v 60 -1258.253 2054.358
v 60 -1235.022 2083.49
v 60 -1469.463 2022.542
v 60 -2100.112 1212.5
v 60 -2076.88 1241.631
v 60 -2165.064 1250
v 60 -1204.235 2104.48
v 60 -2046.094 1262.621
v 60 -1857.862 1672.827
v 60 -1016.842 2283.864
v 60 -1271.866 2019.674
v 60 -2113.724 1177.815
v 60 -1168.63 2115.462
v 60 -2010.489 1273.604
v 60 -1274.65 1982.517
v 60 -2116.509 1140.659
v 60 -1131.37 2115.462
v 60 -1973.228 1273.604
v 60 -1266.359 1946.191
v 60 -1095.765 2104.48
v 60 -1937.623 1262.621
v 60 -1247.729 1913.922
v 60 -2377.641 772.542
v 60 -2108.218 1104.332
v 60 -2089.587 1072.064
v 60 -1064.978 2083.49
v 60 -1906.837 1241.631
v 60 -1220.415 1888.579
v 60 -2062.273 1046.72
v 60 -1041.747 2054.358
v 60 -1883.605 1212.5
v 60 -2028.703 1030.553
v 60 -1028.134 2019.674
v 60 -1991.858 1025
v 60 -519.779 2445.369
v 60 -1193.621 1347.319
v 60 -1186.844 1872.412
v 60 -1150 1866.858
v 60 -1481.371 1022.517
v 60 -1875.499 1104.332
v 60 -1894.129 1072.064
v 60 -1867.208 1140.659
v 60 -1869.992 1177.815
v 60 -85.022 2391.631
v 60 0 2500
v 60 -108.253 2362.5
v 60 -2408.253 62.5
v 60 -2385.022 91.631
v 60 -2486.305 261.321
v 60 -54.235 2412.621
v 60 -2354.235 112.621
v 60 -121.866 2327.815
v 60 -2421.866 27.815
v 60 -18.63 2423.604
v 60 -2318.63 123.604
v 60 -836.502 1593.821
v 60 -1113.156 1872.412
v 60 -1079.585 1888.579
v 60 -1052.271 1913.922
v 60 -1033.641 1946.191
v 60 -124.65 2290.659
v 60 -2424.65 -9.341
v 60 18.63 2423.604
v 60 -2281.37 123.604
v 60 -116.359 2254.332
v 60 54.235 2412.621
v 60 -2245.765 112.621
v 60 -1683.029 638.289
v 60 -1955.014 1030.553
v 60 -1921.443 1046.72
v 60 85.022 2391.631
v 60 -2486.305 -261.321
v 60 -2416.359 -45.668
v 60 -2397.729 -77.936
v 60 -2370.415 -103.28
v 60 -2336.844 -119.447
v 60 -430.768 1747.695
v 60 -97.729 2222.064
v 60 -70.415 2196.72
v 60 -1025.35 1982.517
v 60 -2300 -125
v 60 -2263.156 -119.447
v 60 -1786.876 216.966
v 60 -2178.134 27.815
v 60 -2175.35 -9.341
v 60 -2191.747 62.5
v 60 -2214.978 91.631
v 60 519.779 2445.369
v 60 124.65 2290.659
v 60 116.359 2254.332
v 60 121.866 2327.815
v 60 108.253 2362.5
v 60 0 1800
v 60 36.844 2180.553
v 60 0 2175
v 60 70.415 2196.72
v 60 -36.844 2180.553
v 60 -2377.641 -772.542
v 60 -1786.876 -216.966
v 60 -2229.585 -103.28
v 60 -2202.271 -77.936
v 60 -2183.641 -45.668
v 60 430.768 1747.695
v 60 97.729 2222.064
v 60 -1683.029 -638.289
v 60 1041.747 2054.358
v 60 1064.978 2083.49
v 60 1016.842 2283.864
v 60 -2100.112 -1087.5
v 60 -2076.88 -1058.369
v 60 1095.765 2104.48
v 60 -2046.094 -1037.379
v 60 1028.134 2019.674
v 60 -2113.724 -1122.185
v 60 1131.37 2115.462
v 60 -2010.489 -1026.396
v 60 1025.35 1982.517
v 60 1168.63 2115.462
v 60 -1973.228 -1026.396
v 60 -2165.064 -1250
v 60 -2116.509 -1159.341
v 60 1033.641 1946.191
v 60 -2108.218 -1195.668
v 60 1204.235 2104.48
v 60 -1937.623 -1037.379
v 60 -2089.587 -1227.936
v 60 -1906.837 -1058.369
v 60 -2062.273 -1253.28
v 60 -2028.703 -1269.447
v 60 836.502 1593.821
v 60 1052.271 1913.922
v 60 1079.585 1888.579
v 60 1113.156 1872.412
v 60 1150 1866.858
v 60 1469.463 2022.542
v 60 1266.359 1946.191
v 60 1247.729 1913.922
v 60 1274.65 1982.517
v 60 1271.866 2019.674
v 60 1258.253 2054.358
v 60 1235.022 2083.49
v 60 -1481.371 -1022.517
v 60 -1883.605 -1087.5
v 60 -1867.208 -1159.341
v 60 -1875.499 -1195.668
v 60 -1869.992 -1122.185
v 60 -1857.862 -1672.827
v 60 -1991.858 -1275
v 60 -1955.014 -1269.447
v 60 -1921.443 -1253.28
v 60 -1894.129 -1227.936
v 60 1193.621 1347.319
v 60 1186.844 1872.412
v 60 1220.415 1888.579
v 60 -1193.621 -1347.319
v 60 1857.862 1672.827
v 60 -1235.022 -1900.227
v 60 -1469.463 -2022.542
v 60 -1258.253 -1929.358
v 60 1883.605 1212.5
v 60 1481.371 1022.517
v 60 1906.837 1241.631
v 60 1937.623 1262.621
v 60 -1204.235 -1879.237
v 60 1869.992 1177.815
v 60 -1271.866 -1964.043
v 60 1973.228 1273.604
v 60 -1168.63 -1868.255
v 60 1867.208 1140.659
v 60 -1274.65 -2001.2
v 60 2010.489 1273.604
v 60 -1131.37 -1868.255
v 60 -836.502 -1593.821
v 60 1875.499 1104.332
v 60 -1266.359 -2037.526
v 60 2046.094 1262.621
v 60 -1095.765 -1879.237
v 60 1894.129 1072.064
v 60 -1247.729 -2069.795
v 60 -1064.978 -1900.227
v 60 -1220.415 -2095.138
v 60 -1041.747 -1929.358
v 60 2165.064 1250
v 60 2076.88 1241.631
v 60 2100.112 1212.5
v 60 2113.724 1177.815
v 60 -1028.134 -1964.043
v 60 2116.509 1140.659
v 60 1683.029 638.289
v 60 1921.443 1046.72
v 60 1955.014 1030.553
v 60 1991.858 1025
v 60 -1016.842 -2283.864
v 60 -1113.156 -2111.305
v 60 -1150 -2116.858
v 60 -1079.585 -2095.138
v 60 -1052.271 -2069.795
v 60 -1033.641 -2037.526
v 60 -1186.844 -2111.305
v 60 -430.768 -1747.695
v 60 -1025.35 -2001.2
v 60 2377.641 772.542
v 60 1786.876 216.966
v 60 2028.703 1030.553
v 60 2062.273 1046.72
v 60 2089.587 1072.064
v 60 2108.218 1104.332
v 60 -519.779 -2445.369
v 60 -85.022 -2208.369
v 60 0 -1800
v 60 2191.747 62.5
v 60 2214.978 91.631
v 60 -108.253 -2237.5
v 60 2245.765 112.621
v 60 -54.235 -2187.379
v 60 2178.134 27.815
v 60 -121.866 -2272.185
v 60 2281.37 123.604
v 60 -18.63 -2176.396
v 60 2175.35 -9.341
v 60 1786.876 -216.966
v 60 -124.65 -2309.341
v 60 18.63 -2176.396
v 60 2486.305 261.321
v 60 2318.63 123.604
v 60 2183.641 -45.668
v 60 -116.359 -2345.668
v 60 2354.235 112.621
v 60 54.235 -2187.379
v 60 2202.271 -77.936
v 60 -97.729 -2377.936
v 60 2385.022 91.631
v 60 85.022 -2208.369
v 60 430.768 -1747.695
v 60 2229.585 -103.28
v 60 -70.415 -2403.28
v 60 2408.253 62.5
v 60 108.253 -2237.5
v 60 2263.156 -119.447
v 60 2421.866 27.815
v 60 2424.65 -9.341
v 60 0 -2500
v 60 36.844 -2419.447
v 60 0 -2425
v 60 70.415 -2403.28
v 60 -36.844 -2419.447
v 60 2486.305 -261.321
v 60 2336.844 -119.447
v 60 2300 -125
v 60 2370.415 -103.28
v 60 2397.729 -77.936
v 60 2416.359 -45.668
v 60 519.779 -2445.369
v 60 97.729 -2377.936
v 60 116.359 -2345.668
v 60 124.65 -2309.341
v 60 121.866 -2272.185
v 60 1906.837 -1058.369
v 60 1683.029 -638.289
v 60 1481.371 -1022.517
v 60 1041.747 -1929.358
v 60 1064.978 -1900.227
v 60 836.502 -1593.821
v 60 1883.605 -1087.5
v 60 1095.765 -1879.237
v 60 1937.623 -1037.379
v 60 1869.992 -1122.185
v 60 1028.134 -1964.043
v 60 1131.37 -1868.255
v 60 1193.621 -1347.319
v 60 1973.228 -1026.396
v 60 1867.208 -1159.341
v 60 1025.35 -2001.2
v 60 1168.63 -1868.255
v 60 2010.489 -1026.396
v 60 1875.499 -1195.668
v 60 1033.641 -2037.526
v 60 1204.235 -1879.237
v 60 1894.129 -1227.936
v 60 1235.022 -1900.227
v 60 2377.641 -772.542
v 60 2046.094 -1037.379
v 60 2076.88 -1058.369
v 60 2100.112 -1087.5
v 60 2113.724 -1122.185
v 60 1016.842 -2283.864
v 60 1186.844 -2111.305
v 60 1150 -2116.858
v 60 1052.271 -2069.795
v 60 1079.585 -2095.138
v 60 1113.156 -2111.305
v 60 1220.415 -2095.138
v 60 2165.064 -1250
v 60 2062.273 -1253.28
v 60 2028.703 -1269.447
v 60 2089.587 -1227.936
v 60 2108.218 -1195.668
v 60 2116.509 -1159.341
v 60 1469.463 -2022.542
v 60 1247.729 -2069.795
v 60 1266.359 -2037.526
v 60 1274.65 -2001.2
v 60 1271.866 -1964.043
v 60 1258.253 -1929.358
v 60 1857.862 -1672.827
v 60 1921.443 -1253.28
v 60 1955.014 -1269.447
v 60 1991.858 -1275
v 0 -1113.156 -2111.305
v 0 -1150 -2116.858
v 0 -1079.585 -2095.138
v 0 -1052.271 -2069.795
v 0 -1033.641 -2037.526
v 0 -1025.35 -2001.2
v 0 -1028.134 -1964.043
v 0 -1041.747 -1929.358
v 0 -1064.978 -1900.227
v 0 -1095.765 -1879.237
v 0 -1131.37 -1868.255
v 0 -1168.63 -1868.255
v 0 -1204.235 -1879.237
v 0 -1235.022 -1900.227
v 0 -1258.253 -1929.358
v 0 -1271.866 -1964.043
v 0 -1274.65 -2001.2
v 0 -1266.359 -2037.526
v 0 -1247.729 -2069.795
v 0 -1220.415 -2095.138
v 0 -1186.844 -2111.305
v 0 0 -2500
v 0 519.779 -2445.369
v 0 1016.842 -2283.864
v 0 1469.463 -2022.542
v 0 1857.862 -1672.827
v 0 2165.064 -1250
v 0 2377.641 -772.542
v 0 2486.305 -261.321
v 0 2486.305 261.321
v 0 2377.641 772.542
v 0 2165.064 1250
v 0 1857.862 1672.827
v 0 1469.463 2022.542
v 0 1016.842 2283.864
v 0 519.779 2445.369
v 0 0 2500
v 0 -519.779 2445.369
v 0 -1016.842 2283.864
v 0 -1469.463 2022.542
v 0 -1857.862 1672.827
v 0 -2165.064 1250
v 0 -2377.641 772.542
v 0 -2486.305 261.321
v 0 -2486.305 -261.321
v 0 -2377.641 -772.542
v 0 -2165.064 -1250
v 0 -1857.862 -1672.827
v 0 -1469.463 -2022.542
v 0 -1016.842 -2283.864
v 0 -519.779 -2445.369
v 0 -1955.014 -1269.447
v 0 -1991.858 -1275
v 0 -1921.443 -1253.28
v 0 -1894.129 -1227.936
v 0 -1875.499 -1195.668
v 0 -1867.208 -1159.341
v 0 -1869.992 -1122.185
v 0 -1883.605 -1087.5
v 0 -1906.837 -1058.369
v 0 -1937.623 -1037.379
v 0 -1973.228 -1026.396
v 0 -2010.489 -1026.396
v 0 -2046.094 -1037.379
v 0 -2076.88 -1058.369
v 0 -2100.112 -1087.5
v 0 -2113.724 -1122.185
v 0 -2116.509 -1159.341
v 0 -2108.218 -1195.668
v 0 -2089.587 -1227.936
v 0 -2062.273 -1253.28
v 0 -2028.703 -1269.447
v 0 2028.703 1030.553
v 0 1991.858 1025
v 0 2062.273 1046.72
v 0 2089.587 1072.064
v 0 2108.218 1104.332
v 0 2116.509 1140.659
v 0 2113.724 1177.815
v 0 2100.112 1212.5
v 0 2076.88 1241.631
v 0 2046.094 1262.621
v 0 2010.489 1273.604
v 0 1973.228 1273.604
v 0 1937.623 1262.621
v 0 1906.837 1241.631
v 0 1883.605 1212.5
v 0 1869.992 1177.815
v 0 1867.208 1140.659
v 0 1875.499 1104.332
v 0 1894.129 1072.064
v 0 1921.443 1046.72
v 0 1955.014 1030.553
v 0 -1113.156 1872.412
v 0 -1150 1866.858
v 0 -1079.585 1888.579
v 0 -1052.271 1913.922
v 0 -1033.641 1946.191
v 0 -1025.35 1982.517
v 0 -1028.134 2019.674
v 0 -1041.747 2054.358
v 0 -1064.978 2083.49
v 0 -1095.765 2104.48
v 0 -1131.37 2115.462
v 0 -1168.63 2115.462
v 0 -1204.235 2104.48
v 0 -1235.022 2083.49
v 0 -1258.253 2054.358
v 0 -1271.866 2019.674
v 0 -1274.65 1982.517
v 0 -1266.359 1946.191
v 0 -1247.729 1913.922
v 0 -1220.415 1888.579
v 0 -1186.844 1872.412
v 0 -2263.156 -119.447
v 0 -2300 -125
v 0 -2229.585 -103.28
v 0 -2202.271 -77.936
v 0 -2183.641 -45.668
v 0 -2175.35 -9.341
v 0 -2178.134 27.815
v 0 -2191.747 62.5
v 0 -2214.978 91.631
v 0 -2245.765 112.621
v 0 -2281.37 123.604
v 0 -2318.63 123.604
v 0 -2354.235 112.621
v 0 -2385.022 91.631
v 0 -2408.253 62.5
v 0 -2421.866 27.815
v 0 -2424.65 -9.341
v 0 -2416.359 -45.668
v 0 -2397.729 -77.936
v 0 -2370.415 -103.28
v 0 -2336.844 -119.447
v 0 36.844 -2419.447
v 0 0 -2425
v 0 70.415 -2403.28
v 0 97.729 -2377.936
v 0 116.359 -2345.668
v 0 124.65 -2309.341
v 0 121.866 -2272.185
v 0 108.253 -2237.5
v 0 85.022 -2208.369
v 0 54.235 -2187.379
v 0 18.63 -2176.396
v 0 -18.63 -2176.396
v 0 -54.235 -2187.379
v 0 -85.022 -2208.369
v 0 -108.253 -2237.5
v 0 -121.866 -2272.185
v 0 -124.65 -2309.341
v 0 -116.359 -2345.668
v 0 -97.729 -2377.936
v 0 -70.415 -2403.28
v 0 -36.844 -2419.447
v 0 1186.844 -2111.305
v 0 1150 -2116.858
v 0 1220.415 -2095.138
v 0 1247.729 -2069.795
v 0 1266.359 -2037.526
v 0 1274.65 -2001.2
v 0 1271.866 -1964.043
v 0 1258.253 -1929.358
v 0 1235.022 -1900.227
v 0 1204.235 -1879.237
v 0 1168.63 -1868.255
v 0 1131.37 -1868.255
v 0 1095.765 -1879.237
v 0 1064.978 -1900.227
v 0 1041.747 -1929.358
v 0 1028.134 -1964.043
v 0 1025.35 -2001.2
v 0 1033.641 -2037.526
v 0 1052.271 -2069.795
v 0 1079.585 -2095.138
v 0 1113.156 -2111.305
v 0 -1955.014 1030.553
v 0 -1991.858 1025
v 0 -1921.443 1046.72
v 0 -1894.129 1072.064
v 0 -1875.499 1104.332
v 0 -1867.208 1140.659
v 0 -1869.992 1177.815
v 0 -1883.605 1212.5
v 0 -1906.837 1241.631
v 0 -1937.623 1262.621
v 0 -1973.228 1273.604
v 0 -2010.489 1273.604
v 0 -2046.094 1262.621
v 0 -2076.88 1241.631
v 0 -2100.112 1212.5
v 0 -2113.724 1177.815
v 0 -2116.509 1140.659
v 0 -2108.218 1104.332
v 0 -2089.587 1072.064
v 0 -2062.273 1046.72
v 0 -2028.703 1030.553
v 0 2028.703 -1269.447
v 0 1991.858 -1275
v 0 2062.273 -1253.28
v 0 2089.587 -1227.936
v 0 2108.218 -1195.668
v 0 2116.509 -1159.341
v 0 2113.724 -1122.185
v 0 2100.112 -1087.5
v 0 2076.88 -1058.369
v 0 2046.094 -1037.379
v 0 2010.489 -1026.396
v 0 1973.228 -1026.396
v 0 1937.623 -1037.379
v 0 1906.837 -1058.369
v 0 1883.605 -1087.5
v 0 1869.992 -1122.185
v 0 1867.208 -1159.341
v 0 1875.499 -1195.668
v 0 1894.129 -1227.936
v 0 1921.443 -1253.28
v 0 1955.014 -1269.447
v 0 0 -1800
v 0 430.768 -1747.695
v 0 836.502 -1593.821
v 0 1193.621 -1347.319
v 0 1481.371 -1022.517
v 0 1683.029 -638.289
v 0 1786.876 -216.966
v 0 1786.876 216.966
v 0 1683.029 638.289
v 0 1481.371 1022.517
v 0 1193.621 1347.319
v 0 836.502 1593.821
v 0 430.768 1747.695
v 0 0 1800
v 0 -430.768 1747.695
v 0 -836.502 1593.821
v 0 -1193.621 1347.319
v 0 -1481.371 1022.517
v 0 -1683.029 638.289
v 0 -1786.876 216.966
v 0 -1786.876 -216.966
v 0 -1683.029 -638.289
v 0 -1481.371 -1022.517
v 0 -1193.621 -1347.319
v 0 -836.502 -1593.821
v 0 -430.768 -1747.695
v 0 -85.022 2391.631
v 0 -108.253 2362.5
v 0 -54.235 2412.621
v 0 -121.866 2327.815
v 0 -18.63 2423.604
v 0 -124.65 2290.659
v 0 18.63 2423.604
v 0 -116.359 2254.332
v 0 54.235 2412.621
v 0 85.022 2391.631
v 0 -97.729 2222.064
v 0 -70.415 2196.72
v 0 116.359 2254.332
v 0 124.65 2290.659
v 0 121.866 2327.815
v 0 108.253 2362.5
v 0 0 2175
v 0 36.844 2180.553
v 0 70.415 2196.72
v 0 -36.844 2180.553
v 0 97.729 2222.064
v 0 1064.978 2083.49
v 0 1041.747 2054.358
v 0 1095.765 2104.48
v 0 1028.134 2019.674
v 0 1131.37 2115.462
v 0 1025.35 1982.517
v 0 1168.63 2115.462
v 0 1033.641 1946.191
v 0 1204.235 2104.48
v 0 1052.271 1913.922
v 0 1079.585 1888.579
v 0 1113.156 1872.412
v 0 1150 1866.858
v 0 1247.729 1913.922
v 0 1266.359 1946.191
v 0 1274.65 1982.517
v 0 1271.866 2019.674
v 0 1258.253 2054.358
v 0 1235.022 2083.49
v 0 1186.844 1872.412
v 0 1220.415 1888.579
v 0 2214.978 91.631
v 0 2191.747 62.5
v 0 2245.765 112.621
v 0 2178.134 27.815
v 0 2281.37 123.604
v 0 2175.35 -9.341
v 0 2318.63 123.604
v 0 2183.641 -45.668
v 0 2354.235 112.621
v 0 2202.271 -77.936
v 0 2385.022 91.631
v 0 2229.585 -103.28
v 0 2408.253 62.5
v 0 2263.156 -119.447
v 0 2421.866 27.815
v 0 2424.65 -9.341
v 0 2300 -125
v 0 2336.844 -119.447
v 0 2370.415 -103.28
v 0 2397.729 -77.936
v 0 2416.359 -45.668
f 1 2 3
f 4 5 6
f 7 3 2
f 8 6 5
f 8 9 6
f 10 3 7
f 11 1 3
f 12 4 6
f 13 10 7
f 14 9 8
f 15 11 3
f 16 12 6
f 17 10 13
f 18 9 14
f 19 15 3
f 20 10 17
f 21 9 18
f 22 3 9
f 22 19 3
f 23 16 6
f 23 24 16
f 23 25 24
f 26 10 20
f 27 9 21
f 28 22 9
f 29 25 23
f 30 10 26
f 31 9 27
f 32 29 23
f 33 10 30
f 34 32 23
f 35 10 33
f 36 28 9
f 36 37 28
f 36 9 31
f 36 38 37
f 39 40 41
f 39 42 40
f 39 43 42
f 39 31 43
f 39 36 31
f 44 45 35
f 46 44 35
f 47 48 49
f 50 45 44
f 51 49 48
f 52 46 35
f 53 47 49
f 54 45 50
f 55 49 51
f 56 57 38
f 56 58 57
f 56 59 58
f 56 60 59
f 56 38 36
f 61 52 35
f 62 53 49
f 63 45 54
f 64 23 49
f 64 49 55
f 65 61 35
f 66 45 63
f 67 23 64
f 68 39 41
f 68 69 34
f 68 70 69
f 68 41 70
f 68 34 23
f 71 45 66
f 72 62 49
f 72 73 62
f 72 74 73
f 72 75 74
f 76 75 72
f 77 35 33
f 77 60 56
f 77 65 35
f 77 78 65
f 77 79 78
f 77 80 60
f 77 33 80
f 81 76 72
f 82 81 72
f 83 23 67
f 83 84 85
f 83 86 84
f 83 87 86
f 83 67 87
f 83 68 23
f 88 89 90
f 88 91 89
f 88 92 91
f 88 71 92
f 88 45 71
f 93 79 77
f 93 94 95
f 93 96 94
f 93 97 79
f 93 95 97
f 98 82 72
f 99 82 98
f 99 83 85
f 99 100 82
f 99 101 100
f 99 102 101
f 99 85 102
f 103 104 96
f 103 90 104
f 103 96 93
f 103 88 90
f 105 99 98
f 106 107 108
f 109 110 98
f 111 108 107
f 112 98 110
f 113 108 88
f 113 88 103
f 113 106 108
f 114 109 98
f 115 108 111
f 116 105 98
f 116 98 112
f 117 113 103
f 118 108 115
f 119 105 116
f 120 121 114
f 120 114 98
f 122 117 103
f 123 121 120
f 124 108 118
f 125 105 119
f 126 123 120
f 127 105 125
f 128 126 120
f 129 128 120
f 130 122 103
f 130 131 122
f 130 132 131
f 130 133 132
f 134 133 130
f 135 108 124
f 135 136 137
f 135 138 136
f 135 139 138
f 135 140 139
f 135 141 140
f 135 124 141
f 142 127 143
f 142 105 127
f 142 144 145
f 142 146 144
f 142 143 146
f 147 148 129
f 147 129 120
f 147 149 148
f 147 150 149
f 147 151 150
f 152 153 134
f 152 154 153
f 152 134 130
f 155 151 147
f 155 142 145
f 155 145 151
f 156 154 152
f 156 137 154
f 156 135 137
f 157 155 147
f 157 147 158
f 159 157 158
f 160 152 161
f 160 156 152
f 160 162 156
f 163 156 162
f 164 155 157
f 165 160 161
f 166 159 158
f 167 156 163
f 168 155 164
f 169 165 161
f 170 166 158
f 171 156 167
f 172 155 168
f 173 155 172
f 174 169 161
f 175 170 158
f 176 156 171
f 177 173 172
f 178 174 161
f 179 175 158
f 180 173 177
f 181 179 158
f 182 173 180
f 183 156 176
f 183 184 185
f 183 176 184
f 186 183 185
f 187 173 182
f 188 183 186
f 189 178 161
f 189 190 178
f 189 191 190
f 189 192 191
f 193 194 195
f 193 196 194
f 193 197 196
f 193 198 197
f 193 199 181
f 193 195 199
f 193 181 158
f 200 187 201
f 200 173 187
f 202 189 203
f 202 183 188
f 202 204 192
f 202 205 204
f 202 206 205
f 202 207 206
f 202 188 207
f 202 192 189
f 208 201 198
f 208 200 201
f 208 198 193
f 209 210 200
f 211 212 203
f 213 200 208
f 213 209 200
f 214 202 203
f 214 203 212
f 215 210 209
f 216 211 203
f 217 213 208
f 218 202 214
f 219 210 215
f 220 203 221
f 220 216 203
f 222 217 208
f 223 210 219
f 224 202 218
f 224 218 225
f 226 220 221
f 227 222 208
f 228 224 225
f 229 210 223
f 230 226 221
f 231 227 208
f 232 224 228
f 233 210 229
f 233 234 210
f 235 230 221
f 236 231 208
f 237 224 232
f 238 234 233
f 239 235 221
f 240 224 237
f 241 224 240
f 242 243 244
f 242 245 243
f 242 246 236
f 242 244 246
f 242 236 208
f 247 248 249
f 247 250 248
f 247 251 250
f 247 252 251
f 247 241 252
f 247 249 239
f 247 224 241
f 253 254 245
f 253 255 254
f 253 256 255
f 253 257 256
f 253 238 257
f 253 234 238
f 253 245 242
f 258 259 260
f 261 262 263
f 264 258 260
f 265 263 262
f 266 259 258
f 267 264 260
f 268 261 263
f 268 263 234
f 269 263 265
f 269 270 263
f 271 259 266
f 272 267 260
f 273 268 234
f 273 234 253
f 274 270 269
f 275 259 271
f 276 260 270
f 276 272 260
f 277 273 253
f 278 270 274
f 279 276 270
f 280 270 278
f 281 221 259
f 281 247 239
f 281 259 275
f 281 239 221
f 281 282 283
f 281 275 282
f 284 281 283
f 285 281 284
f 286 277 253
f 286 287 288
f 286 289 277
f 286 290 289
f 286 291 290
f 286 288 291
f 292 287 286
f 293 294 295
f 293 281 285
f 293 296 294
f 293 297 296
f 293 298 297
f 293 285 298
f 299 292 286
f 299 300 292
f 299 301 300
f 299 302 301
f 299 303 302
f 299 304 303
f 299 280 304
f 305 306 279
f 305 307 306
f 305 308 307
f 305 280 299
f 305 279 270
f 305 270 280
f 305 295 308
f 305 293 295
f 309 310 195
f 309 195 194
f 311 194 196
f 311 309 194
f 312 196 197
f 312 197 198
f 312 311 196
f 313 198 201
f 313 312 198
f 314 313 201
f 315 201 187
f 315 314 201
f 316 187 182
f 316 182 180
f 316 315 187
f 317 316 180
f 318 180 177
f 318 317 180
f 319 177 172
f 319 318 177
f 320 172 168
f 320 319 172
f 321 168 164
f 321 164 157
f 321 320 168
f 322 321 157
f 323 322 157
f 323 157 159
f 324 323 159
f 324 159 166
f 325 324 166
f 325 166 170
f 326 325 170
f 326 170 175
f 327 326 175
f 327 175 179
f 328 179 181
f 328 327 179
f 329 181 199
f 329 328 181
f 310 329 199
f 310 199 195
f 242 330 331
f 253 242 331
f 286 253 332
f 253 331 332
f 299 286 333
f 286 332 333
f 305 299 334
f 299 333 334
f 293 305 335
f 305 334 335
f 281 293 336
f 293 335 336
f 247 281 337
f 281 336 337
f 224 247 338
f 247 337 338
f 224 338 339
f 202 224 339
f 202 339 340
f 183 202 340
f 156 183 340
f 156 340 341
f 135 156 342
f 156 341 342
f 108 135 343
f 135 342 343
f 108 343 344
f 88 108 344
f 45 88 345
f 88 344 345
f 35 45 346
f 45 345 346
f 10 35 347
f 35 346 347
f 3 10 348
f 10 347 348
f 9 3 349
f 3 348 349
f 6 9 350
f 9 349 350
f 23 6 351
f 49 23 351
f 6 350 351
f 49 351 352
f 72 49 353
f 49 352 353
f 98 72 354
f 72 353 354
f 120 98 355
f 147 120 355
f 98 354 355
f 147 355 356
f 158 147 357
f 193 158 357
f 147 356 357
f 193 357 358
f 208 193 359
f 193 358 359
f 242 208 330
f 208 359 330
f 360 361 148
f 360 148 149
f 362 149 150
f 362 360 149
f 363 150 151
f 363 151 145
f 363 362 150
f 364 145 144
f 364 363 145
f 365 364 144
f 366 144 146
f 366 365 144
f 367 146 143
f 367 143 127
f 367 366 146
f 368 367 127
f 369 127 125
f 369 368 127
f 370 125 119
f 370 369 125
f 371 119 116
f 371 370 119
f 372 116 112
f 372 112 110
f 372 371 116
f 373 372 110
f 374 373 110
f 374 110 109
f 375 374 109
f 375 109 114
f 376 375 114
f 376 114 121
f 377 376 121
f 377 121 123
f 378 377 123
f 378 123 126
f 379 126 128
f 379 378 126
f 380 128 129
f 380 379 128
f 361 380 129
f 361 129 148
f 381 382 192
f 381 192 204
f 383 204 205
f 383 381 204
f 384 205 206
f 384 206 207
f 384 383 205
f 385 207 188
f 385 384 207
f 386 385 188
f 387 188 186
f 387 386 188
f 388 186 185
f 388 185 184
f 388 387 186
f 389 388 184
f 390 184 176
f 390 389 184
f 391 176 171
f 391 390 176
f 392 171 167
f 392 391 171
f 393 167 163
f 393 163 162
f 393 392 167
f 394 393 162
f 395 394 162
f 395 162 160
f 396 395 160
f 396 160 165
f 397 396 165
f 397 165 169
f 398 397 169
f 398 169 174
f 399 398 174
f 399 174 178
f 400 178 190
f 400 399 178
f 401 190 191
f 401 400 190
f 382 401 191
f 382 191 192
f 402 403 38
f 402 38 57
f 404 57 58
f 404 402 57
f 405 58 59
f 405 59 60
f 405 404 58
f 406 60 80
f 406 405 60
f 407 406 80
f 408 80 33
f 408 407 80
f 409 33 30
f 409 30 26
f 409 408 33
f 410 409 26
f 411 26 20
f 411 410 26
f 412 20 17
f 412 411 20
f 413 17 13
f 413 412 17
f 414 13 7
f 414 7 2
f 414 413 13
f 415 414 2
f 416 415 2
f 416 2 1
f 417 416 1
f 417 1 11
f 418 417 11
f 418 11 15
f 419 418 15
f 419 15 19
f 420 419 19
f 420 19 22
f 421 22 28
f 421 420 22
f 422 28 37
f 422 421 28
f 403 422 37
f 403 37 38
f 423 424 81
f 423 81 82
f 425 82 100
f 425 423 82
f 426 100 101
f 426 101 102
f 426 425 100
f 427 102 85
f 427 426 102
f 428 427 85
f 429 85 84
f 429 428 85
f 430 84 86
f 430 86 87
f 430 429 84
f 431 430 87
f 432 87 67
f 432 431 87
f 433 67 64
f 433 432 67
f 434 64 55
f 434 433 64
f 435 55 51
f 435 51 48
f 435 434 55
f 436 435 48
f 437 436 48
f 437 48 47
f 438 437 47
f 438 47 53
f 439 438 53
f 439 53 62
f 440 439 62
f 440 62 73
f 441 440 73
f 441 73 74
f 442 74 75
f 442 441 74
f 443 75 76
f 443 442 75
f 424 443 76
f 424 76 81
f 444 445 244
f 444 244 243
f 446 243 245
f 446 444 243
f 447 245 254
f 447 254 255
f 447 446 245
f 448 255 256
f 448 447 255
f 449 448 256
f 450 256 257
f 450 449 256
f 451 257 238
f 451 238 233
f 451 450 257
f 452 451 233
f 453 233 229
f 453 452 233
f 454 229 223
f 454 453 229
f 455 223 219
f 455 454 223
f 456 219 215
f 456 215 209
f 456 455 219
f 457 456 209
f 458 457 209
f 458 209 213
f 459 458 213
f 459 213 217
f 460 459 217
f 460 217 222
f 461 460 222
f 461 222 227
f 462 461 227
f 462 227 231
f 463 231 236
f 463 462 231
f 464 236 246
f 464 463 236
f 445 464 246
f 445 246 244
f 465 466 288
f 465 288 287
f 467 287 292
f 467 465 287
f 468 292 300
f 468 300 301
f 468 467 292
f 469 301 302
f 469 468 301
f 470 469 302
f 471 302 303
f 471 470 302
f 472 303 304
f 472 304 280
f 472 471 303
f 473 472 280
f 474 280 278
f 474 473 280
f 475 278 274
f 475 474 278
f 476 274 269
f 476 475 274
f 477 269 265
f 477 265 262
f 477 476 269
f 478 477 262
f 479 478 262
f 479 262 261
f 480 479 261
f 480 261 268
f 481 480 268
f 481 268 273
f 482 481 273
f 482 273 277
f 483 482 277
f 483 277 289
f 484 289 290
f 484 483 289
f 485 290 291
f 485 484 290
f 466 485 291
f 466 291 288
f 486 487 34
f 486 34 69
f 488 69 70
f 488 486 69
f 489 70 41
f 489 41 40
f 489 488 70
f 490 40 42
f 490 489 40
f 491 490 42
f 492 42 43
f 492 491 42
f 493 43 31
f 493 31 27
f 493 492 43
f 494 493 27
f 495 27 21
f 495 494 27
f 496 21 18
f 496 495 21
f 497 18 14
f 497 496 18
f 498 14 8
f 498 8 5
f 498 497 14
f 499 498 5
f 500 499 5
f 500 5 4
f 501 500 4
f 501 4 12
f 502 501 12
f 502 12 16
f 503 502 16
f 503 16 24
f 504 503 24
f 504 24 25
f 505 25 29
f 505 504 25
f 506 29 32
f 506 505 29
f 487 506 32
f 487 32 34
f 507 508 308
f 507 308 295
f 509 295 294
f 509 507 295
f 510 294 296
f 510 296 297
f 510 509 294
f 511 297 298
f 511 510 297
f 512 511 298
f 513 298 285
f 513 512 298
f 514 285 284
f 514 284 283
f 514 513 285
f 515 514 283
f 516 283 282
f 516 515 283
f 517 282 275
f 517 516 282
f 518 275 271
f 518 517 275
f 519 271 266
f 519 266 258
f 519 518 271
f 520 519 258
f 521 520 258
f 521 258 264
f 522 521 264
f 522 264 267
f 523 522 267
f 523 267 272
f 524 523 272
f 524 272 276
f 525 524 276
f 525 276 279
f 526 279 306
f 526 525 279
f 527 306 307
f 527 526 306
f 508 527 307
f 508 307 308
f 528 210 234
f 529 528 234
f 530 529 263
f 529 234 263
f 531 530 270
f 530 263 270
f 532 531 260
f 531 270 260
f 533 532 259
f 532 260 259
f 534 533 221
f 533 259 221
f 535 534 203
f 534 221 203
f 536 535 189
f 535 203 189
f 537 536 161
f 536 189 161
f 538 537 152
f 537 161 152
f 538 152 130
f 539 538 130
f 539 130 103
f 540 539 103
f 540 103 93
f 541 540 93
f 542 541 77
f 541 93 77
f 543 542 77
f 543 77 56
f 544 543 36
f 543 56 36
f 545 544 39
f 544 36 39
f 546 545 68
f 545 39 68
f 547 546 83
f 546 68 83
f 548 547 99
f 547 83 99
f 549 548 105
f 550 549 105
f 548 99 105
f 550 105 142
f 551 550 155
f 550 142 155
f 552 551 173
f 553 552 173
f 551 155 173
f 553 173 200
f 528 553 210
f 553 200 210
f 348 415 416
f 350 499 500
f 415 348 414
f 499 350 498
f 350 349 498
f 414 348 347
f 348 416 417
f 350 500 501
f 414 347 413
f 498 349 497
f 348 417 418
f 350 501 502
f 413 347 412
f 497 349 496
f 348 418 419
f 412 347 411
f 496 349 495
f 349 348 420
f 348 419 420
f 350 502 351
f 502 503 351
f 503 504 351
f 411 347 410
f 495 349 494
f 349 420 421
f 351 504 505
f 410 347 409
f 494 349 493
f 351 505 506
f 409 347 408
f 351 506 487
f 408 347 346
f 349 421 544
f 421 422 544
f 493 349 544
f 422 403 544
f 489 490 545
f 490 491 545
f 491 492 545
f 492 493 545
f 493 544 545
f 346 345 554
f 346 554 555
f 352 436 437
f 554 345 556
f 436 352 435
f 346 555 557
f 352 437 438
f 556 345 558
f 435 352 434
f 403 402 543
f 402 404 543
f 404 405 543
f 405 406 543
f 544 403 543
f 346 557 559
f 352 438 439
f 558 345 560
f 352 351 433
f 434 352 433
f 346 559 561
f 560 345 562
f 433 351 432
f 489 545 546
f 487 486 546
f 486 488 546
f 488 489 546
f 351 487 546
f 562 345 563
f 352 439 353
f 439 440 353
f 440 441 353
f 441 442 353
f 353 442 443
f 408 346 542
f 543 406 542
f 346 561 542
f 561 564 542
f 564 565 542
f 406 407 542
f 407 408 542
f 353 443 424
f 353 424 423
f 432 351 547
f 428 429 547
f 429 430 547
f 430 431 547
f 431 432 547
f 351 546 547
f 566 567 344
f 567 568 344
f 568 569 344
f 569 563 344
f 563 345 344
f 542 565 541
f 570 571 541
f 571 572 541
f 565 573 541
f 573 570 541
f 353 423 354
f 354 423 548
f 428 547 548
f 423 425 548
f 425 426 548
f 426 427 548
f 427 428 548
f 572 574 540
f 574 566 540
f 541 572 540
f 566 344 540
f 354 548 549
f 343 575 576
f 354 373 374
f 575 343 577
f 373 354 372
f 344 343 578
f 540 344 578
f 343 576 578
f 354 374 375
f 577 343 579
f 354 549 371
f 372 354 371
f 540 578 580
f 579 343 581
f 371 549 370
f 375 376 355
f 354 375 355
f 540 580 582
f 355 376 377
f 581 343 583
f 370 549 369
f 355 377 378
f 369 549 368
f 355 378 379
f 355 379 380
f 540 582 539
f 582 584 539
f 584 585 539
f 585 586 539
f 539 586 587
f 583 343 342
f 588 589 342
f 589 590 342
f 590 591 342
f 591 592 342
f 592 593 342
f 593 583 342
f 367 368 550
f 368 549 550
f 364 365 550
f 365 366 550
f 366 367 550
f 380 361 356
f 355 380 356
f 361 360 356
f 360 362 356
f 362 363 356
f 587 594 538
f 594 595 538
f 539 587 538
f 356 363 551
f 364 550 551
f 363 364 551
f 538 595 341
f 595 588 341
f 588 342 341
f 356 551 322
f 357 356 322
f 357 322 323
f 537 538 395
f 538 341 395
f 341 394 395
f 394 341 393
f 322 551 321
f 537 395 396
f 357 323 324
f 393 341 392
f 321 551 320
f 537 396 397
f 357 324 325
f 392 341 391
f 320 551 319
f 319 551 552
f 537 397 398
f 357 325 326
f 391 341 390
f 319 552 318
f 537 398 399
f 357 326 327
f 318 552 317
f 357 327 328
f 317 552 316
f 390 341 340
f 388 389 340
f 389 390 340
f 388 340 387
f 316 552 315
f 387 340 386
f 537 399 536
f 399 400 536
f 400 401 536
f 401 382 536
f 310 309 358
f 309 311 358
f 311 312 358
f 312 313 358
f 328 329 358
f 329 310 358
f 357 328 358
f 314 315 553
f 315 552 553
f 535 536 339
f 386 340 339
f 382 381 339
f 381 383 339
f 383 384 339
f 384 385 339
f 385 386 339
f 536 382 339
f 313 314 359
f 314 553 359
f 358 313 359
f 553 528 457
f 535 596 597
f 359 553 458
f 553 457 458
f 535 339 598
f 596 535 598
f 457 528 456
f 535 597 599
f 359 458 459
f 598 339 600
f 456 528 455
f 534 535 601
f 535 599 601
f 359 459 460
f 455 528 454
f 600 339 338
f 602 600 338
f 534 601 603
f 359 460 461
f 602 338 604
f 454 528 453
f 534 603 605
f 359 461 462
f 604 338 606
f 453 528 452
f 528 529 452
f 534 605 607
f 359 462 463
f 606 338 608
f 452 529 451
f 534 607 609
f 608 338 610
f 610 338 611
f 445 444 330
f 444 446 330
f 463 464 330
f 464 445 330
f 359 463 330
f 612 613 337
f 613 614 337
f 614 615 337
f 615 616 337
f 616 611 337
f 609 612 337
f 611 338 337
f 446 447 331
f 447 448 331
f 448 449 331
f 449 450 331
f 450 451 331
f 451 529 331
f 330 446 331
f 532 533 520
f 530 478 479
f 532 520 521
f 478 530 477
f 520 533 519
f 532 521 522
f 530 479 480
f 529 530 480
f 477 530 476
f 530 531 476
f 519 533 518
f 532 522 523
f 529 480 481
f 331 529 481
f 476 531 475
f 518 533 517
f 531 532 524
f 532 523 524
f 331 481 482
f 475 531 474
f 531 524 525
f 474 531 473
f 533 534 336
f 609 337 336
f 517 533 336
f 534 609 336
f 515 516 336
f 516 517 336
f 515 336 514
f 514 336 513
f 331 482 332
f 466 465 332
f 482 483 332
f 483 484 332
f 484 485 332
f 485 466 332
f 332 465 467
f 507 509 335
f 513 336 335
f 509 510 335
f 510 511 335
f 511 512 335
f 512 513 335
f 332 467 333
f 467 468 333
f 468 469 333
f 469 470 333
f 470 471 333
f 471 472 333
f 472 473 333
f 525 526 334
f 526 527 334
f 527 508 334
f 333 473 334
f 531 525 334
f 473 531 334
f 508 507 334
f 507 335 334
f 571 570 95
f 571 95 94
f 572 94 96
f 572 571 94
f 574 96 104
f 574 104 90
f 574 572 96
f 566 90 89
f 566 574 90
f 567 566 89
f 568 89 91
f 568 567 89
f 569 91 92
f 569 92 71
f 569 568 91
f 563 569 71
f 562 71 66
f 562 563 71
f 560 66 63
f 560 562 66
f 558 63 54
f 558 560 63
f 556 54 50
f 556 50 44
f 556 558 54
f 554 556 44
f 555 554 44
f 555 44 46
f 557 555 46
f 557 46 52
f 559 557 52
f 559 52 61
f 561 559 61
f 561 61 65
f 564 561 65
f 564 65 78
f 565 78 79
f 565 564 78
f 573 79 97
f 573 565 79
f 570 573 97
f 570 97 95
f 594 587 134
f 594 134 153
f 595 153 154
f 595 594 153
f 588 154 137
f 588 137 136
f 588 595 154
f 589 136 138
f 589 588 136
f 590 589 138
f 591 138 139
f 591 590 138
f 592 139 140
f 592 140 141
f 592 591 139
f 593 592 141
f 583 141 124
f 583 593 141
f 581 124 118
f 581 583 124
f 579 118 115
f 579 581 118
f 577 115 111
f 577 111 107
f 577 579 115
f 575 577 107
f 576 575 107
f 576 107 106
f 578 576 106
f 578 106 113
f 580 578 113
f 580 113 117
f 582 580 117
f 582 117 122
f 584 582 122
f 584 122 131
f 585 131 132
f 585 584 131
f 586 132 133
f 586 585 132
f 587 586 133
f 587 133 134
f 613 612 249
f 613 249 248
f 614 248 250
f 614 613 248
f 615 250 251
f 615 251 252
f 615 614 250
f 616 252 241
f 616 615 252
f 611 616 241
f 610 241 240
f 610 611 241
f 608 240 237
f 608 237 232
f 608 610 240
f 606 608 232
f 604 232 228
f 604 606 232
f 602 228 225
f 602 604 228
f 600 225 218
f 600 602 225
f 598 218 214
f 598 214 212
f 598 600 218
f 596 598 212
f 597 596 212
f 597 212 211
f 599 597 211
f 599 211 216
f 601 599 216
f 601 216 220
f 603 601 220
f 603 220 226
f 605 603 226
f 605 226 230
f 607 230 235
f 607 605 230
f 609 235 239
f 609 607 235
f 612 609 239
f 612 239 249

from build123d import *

# Parameters (mm, degrees)
SKETCH1_R           = 2500
SKETCH1_R_2         = 125
BOSS_EXTRUDE1_DEPTH = 60
SKETCH3_R           = 1800
CUT_EXTRUDE1_DEPTH  = 60


with BuildPart() as part:
    # Sketch1 → Boss-Extrude1 (new body)
    with BuildSketch(Plane(origin=(0, 0, 0), x_dir=(0, 0, -1), z_dir=(1, 0, 0))):
        Circle(SKETCH1_R)
        with Locations((0, 2300)):
            Circle(SKETCH1_R_2, mode=Mode.SUBTRACT)
        with Locations((1150, 1991.858428704)):
            Circle(SKETCH1_R_2, mode=Mode.SUBTRACT)
        with Locations((1991.858428704, 1150)):
            Circle(SKETCH1_R_2, mode=Mode.SUBTRACT)
        with Locations((2300, 0)):
            Circle(SKETCH1_R_2, mode=Mode.SUBTRACT)
        with Locations((1991.858428704, -1150)):
            Circle(SKETCH1_R_2, mode=Mode.SUBTRACT)
        with Locations((1150, -1991.858428704)):
            Circle(SKETCH1_R_2, mode=Mode.SUBTRACT)
        with Locations((0, -2300)):
            Circle(SKETCH1_R_2, mode=Mode.SUBTRACT)
        with Locations((-1150, -1991.858428704)):
            Circle(SKETCH1_R_2, mode=Mode.SUBTRACT)
        with Locations((-1991.858428704, -1150)):
            Circle(SKETCH1_R_2, mode=Mode.SUBTRACT)
        with Locations((-2300, 0)):
            Circle(SKETCH1_R_2, mode=Mode.SUBTRACT)
        with Locations((-1991.858428704, 1150)):
            Circle(SKETCH1_R_2, mode=Mode.SUBTRACT)
        with Locations((-1150, 1991.858428704)):
            Circle(SKETCH1_R_2, mode=Mode.SUBTRACT)
    extrude(amount=BOSS_EXTRUDE1_DEPTH)

    # Sketch3 → Cut-Extrude1 (cut)
    with BuildSketch(Plane(origin=(60, 0, 0), x_dir=(0, 0, -1), z_dir=(1, 0, 0))):
        Circle(SKETCH3_R)
    extrude(amount=-CUT_EXTRUDE1_DEPTH, mode=Mode.SUBTRACT)


solid = part.part
